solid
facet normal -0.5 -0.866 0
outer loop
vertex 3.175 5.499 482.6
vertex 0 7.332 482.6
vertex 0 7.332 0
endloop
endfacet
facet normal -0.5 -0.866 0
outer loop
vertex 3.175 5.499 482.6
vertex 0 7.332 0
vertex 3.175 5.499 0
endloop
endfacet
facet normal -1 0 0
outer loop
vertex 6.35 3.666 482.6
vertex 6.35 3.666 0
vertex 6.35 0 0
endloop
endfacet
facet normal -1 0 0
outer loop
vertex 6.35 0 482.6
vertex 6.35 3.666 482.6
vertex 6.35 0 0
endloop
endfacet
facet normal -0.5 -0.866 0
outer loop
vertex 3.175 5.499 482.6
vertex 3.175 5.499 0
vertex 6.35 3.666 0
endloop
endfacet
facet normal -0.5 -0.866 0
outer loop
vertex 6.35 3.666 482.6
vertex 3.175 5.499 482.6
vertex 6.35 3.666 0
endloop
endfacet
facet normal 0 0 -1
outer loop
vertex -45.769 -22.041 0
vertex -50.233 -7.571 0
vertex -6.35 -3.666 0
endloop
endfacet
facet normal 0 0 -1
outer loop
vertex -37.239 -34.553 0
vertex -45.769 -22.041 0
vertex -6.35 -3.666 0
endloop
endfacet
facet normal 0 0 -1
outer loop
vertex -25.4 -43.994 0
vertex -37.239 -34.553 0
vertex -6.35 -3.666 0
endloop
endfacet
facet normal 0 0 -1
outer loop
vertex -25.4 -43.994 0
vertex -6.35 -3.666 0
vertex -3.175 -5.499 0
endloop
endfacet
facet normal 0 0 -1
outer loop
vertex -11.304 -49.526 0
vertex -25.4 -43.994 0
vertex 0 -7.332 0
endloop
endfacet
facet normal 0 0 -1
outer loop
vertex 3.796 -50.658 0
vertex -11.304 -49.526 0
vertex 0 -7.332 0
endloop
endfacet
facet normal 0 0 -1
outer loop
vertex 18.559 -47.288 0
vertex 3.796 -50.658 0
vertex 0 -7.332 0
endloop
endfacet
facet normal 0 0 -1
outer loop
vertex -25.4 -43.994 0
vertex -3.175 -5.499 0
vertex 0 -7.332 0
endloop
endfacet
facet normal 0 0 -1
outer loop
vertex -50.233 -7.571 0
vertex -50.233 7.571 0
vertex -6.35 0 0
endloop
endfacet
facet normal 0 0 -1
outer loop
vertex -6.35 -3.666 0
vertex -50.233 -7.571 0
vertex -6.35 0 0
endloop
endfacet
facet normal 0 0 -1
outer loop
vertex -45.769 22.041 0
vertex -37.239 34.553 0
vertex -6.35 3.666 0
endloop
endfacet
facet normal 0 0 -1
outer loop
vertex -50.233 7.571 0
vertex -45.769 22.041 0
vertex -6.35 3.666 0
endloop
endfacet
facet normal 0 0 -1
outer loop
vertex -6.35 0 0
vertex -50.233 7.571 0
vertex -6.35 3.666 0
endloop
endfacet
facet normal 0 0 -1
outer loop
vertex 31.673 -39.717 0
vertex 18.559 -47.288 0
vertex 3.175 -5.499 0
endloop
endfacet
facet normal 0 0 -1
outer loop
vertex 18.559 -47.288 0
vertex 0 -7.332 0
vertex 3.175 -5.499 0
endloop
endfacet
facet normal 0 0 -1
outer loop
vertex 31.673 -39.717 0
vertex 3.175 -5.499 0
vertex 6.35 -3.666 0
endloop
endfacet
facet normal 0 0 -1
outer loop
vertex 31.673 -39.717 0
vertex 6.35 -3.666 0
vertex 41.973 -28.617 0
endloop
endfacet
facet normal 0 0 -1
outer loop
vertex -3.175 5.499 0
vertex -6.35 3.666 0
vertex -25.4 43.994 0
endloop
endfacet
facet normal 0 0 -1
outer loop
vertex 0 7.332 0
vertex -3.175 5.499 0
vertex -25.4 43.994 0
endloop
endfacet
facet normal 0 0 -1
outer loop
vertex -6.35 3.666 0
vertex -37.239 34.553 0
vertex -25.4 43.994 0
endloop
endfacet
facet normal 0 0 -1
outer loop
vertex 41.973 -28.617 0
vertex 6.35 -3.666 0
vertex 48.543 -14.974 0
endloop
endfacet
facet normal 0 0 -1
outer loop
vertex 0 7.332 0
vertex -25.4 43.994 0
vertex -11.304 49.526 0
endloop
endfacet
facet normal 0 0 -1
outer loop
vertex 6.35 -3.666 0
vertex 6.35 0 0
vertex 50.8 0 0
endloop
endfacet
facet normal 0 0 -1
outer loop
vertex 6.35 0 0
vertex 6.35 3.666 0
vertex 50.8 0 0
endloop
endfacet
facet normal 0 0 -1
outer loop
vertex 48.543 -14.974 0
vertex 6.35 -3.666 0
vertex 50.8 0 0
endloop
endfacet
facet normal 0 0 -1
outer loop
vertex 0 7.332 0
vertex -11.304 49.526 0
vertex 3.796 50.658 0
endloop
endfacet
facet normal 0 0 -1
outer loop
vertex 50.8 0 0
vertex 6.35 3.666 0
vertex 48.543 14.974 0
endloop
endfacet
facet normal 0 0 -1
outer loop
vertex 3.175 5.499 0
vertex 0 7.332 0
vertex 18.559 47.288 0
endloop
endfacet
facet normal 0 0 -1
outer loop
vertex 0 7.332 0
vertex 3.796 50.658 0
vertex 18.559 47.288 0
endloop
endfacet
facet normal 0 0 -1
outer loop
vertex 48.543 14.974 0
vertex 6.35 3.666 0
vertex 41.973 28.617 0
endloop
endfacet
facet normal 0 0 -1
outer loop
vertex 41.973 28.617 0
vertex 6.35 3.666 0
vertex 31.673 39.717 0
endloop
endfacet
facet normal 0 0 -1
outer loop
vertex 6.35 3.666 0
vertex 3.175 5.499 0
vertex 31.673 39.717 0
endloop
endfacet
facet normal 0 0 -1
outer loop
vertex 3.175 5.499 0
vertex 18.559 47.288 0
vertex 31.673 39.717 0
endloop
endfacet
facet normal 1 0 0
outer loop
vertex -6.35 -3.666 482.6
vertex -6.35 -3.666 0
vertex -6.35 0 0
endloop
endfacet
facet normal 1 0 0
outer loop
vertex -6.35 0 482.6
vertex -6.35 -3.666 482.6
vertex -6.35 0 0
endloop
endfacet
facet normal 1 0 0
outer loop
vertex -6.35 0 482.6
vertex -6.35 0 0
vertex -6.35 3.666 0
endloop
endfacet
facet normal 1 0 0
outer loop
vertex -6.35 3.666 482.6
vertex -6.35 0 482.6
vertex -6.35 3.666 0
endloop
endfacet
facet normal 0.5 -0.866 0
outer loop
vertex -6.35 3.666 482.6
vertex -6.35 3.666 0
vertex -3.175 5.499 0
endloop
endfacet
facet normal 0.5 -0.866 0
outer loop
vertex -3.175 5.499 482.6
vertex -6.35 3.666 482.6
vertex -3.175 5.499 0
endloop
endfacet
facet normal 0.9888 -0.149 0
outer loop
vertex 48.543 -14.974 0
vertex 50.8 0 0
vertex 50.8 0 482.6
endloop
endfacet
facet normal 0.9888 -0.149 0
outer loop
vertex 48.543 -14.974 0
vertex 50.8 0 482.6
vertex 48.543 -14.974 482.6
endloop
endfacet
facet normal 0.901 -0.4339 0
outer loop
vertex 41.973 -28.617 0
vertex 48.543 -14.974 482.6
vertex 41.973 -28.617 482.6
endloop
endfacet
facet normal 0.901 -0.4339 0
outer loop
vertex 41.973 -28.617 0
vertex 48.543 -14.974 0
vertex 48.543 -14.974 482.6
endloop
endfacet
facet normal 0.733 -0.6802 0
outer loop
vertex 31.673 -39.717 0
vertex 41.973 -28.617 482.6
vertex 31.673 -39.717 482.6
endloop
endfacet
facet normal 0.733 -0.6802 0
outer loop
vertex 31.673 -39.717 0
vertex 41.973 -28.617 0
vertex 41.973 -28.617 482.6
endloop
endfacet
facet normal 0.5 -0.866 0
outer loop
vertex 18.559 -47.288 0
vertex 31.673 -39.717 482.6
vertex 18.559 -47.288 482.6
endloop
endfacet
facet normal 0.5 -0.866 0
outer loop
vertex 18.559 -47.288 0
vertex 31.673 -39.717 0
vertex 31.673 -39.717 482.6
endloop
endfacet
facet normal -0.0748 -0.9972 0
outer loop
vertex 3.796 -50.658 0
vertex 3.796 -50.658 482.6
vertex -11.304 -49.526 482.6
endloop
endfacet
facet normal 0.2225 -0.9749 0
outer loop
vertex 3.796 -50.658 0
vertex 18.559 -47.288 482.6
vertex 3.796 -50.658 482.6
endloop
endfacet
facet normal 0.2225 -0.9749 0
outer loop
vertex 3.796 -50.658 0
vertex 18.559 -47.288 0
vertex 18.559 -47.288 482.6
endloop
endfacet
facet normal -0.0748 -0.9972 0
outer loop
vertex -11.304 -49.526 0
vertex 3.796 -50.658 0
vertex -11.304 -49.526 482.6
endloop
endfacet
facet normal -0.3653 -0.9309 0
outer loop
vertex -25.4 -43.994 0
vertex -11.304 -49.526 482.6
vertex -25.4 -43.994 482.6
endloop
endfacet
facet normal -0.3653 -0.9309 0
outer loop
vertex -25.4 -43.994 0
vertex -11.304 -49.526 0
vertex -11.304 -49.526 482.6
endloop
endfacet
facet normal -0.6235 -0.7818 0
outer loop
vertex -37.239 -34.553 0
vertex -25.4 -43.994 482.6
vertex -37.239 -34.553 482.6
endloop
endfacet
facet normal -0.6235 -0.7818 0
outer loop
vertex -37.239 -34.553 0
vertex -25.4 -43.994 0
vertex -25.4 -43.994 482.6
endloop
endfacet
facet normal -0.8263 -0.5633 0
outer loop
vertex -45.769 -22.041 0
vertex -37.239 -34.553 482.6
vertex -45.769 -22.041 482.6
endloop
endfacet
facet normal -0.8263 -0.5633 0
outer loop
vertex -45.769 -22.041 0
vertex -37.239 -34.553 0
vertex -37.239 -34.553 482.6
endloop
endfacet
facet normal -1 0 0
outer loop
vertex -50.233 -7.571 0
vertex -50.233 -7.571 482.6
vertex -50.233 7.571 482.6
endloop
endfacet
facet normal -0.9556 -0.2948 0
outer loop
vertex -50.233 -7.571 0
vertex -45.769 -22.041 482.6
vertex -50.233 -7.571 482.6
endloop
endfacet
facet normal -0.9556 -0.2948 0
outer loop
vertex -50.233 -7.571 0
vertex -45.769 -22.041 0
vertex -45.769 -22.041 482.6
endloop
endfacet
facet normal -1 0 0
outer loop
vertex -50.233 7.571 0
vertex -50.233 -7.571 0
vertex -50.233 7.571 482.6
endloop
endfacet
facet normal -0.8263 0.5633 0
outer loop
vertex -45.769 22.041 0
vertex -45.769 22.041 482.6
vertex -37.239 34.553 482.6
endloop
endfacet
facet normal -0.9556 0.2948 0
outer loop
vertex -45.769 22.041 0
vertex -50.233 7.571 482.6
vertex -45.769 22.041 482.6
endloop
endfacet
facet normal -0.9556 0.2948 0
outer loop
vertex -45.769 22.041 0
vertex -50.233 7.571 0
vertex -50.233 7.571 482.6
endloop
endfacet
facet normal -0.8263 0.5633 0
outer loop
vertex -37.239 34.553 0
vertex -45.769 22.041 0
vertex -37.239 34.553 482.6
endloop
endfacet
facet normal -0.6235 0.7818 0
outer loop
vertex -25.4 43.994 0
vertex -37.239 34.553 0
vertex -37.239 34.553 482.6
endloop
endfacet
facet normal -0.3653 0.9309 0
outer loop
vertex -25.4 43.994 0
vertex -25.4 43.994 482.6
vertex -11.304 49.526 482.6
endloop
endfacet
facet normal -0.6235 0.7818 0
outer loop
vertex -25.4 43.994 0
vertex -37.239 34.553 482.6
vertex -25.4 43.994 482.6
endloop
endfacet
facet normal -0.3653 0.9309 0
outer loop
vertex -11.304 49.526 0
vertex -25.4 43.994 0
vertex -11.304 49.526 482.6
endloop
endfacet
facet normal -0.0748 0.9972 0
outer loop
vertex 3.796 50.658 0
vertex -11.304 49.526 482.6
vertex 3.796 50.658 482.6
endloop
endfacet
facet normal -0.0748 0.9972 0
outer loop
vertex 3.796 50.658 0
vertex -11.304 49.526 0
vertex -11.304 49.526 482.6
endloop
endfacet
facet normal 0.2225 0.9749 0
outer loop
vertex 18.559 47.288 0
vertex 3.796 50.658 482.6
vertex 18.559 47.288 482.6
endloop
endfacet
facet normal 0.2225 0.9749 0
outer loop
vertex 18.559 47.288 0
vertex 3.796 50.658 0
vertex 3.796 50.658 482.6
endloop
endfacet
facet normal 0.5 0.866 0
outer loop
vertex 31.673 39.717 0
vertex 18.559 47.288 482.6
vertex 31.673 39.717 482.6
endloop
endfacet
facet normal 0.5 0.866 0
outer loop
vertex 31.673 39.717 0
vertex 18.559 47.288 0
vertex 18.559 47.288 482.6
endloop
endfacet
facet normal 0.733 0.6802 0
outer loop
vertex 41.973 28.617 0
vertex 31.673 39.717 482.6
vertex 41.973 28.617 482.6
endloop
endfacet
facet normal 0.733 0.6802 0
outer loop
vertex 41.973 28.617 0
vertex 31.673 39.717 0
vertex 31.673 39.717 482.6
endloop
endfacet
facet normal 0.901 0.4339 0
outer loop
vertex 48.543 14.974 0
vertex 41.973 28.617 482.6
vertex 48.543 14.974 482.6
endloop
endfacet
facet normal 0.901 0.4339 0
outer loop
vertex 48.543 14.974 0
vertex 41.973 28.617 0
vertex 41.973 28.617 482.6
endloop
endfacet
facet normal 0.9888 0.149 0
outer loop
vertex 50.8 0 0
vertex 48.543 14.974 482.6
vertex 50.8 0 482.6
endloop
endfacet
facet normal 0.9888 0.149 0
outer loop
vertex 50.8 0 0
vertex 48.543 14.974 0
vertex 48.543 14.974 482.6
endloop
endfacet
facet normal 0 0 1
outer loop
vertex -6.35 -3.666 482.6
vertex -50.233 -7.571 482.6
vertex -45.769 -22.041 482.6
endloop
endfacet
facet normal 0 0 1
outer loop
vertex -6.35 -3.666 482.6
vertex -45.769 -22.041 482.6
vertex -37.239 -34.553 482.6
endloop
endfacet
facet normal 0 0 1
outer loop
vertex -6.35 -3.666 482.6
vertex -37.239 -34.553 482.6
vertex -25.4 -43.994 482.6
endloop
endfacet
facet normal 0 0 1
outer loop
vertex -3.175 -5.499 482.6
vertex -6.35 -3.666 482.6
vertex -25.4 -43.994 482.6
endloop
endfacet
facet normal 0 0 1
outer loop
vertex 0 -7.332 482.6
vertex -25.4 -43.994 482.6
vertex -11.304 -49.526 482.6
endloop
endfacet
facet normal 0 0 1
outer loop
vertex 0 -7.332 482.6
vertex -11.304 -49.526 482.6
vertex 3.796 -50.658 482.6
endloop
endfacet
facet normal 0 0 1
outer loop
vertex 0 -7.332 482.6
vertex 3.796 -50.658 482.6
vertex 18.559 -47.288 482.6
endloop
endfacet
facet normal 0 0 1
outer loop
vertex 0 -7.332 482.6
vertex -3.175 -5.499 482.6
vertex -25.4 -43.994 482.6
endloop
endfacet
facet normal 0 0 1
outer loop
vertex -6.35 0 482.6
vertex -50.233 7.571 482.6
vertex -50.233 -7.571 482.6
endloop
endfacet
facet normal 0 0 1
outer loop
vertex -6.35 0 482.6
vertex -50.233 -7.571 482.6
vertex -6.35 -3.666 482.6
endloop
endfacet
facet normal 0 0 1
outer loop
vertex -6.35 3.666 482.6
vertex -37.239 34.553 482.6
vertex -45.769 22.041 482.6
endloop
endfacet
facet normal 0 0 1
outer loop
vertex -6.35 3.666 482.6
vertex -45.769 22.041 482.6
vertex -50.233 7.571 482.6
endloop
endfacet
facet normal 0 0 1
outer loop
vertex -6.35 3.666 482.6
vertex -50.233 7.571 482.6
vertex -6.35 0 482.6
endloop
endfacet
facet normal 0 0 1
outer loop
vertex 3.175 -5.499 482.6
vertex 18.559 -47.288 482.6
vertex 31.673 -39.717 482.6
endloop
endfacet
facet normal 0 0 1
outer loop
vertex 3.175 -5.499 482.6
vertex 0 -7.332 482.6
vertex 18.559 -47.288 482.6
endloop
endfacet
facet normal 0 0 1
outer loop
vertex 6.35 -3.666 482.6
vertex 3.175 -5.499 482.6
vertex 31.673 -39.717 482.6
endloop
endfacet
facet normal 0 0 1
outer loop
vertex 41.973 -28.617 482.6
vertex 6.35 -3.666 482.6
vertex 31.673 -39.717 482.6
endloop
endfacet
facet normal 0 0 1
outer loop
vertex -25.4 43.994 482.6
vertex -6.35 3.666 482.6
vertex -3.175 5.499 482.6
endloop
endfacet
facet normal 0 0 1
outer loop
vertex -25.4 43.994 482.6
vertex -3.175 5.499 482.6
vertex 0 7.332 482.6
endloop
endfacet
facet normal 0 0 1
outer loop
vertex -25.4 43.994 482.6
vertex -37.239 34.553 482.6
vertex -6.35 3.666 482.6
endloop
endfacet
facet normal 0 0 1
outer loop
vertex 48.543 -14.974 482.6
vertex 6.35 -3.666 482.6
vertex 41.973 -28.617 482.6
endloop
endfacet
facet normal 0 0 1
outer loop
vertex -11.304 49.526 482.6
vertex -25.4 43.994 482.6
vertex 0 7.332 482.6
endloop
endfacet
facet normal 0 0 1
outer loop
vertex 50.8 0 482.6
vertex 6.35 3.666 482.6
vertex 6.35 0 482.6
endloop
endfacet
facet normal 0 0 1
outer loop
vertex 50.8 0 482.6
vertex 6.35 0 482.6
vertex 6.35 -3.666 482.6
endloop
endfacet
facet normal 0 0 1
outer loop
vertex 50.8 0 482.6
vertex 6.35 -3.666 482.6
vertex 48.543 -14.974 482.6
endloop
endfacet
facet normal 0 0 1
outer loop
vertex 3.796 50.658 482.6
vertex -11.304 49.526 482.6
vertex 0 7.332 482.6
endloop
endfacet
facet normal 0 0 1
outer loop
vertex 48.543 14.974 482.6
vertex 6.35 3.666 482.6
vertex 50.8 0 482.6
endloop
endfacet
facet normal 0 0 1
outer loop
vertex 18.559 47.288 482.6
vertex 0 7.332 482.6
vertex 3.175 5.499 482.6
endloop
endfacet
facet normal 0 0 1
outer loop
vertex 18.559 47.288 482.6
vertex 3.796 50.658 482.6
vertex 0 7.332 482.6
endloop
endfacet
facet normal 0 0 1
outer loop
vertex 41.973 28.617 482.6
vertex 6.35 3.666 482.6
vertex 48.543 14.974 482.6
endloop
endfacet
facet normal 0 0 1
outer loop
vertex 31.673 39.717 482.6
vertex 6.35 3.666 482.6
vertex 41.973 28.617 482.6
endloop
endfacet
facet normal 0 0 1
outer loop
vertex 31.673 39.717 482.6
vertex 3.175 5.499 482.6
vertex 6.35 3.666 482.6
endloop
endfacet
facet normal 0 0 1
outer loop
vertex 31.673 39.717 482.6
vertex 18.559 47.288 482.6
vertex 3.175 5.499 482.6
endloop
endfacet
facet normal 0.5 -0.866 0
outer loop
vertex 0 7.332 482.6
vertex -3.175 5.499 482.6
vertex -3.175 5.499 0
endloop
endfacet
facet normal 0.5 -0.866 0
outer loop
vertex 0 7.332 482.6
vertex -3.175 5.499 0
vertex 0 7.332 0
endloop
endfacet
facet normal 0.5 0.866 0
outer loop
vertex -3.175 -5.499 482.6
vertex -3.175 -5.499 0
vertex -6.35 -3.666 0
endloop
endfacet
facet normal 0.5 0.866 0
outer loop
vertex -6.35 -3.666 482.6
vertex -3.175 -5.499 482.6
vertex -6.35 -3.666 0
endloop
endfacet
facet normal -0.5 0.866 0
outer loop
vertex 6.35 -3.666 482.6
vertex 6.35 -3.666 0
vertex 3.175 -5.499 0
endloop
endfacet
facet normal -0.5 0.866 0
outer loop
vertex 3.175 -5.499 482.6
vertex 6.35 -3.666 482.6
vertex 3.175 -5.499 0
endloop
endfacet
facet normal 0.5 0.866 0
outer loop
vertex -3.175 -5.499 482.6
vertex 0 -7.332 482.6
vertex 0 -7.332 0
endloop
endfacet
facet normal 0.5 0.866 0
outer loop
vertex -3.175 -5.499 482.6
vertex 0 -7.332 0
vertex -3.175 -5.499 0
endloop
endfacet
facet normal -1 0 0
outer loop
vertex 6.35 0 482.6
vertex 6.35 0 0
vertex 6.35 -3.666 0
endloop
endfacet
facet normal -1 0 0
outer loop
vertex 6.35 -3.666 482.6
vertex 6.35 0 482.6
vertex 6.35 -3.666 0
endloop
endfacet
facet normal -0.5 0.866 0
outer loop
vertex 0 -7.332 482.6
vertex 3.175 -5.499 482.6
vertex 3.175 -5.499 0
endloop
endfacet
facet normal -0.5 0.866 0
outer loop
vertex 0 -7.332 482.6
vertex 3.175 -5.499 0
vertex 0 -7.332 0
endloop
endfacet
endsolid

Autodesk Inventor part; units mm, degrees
ref_plane "YZ Plane" through (0, 0, 0) normal (1, 0, 0) x (0, 1, 0)
ref_plane "XZ Plane" through (0, 0, 0) normal (0, 1, 0) x (-1, 0, 0)
ref_plane "XY Plane" through (0, 0, 0) normal (0, 0, 1) x (1, 0, 0)
sketch "Sketch1" plane through (0, 0, 0) normal (0, 0, 1) x (1, 0, 0)
  circle A0 centre (0, 0) radius 50.8
  circle A1 centre (0, 0) radius 6.35
  line L0 (6.35, -3.6662) -> (0, -7.3323)
  line L1 (0, -7.3323) -> (-6.35, -3.6662)
  line L2 (-6.35, -3.6662) -> (-6.35, 3.6662)
  line L3 (-6.35, 3.6662) -> (0, 7.3323)
  line L4 (0, 7.3323) -> (6.35, 3.6662)
  line L5 (6.35, 3.6662) -> (6.35, -3.6662)
  point P0 (6.35, 0)
  dimension "d4" = 12.7
  dimension "d0" = 101.6
extrude "Extrusion1" add sketch "Sketch1" along normal blind 482.6
properties part number "4-bar intake roller"
